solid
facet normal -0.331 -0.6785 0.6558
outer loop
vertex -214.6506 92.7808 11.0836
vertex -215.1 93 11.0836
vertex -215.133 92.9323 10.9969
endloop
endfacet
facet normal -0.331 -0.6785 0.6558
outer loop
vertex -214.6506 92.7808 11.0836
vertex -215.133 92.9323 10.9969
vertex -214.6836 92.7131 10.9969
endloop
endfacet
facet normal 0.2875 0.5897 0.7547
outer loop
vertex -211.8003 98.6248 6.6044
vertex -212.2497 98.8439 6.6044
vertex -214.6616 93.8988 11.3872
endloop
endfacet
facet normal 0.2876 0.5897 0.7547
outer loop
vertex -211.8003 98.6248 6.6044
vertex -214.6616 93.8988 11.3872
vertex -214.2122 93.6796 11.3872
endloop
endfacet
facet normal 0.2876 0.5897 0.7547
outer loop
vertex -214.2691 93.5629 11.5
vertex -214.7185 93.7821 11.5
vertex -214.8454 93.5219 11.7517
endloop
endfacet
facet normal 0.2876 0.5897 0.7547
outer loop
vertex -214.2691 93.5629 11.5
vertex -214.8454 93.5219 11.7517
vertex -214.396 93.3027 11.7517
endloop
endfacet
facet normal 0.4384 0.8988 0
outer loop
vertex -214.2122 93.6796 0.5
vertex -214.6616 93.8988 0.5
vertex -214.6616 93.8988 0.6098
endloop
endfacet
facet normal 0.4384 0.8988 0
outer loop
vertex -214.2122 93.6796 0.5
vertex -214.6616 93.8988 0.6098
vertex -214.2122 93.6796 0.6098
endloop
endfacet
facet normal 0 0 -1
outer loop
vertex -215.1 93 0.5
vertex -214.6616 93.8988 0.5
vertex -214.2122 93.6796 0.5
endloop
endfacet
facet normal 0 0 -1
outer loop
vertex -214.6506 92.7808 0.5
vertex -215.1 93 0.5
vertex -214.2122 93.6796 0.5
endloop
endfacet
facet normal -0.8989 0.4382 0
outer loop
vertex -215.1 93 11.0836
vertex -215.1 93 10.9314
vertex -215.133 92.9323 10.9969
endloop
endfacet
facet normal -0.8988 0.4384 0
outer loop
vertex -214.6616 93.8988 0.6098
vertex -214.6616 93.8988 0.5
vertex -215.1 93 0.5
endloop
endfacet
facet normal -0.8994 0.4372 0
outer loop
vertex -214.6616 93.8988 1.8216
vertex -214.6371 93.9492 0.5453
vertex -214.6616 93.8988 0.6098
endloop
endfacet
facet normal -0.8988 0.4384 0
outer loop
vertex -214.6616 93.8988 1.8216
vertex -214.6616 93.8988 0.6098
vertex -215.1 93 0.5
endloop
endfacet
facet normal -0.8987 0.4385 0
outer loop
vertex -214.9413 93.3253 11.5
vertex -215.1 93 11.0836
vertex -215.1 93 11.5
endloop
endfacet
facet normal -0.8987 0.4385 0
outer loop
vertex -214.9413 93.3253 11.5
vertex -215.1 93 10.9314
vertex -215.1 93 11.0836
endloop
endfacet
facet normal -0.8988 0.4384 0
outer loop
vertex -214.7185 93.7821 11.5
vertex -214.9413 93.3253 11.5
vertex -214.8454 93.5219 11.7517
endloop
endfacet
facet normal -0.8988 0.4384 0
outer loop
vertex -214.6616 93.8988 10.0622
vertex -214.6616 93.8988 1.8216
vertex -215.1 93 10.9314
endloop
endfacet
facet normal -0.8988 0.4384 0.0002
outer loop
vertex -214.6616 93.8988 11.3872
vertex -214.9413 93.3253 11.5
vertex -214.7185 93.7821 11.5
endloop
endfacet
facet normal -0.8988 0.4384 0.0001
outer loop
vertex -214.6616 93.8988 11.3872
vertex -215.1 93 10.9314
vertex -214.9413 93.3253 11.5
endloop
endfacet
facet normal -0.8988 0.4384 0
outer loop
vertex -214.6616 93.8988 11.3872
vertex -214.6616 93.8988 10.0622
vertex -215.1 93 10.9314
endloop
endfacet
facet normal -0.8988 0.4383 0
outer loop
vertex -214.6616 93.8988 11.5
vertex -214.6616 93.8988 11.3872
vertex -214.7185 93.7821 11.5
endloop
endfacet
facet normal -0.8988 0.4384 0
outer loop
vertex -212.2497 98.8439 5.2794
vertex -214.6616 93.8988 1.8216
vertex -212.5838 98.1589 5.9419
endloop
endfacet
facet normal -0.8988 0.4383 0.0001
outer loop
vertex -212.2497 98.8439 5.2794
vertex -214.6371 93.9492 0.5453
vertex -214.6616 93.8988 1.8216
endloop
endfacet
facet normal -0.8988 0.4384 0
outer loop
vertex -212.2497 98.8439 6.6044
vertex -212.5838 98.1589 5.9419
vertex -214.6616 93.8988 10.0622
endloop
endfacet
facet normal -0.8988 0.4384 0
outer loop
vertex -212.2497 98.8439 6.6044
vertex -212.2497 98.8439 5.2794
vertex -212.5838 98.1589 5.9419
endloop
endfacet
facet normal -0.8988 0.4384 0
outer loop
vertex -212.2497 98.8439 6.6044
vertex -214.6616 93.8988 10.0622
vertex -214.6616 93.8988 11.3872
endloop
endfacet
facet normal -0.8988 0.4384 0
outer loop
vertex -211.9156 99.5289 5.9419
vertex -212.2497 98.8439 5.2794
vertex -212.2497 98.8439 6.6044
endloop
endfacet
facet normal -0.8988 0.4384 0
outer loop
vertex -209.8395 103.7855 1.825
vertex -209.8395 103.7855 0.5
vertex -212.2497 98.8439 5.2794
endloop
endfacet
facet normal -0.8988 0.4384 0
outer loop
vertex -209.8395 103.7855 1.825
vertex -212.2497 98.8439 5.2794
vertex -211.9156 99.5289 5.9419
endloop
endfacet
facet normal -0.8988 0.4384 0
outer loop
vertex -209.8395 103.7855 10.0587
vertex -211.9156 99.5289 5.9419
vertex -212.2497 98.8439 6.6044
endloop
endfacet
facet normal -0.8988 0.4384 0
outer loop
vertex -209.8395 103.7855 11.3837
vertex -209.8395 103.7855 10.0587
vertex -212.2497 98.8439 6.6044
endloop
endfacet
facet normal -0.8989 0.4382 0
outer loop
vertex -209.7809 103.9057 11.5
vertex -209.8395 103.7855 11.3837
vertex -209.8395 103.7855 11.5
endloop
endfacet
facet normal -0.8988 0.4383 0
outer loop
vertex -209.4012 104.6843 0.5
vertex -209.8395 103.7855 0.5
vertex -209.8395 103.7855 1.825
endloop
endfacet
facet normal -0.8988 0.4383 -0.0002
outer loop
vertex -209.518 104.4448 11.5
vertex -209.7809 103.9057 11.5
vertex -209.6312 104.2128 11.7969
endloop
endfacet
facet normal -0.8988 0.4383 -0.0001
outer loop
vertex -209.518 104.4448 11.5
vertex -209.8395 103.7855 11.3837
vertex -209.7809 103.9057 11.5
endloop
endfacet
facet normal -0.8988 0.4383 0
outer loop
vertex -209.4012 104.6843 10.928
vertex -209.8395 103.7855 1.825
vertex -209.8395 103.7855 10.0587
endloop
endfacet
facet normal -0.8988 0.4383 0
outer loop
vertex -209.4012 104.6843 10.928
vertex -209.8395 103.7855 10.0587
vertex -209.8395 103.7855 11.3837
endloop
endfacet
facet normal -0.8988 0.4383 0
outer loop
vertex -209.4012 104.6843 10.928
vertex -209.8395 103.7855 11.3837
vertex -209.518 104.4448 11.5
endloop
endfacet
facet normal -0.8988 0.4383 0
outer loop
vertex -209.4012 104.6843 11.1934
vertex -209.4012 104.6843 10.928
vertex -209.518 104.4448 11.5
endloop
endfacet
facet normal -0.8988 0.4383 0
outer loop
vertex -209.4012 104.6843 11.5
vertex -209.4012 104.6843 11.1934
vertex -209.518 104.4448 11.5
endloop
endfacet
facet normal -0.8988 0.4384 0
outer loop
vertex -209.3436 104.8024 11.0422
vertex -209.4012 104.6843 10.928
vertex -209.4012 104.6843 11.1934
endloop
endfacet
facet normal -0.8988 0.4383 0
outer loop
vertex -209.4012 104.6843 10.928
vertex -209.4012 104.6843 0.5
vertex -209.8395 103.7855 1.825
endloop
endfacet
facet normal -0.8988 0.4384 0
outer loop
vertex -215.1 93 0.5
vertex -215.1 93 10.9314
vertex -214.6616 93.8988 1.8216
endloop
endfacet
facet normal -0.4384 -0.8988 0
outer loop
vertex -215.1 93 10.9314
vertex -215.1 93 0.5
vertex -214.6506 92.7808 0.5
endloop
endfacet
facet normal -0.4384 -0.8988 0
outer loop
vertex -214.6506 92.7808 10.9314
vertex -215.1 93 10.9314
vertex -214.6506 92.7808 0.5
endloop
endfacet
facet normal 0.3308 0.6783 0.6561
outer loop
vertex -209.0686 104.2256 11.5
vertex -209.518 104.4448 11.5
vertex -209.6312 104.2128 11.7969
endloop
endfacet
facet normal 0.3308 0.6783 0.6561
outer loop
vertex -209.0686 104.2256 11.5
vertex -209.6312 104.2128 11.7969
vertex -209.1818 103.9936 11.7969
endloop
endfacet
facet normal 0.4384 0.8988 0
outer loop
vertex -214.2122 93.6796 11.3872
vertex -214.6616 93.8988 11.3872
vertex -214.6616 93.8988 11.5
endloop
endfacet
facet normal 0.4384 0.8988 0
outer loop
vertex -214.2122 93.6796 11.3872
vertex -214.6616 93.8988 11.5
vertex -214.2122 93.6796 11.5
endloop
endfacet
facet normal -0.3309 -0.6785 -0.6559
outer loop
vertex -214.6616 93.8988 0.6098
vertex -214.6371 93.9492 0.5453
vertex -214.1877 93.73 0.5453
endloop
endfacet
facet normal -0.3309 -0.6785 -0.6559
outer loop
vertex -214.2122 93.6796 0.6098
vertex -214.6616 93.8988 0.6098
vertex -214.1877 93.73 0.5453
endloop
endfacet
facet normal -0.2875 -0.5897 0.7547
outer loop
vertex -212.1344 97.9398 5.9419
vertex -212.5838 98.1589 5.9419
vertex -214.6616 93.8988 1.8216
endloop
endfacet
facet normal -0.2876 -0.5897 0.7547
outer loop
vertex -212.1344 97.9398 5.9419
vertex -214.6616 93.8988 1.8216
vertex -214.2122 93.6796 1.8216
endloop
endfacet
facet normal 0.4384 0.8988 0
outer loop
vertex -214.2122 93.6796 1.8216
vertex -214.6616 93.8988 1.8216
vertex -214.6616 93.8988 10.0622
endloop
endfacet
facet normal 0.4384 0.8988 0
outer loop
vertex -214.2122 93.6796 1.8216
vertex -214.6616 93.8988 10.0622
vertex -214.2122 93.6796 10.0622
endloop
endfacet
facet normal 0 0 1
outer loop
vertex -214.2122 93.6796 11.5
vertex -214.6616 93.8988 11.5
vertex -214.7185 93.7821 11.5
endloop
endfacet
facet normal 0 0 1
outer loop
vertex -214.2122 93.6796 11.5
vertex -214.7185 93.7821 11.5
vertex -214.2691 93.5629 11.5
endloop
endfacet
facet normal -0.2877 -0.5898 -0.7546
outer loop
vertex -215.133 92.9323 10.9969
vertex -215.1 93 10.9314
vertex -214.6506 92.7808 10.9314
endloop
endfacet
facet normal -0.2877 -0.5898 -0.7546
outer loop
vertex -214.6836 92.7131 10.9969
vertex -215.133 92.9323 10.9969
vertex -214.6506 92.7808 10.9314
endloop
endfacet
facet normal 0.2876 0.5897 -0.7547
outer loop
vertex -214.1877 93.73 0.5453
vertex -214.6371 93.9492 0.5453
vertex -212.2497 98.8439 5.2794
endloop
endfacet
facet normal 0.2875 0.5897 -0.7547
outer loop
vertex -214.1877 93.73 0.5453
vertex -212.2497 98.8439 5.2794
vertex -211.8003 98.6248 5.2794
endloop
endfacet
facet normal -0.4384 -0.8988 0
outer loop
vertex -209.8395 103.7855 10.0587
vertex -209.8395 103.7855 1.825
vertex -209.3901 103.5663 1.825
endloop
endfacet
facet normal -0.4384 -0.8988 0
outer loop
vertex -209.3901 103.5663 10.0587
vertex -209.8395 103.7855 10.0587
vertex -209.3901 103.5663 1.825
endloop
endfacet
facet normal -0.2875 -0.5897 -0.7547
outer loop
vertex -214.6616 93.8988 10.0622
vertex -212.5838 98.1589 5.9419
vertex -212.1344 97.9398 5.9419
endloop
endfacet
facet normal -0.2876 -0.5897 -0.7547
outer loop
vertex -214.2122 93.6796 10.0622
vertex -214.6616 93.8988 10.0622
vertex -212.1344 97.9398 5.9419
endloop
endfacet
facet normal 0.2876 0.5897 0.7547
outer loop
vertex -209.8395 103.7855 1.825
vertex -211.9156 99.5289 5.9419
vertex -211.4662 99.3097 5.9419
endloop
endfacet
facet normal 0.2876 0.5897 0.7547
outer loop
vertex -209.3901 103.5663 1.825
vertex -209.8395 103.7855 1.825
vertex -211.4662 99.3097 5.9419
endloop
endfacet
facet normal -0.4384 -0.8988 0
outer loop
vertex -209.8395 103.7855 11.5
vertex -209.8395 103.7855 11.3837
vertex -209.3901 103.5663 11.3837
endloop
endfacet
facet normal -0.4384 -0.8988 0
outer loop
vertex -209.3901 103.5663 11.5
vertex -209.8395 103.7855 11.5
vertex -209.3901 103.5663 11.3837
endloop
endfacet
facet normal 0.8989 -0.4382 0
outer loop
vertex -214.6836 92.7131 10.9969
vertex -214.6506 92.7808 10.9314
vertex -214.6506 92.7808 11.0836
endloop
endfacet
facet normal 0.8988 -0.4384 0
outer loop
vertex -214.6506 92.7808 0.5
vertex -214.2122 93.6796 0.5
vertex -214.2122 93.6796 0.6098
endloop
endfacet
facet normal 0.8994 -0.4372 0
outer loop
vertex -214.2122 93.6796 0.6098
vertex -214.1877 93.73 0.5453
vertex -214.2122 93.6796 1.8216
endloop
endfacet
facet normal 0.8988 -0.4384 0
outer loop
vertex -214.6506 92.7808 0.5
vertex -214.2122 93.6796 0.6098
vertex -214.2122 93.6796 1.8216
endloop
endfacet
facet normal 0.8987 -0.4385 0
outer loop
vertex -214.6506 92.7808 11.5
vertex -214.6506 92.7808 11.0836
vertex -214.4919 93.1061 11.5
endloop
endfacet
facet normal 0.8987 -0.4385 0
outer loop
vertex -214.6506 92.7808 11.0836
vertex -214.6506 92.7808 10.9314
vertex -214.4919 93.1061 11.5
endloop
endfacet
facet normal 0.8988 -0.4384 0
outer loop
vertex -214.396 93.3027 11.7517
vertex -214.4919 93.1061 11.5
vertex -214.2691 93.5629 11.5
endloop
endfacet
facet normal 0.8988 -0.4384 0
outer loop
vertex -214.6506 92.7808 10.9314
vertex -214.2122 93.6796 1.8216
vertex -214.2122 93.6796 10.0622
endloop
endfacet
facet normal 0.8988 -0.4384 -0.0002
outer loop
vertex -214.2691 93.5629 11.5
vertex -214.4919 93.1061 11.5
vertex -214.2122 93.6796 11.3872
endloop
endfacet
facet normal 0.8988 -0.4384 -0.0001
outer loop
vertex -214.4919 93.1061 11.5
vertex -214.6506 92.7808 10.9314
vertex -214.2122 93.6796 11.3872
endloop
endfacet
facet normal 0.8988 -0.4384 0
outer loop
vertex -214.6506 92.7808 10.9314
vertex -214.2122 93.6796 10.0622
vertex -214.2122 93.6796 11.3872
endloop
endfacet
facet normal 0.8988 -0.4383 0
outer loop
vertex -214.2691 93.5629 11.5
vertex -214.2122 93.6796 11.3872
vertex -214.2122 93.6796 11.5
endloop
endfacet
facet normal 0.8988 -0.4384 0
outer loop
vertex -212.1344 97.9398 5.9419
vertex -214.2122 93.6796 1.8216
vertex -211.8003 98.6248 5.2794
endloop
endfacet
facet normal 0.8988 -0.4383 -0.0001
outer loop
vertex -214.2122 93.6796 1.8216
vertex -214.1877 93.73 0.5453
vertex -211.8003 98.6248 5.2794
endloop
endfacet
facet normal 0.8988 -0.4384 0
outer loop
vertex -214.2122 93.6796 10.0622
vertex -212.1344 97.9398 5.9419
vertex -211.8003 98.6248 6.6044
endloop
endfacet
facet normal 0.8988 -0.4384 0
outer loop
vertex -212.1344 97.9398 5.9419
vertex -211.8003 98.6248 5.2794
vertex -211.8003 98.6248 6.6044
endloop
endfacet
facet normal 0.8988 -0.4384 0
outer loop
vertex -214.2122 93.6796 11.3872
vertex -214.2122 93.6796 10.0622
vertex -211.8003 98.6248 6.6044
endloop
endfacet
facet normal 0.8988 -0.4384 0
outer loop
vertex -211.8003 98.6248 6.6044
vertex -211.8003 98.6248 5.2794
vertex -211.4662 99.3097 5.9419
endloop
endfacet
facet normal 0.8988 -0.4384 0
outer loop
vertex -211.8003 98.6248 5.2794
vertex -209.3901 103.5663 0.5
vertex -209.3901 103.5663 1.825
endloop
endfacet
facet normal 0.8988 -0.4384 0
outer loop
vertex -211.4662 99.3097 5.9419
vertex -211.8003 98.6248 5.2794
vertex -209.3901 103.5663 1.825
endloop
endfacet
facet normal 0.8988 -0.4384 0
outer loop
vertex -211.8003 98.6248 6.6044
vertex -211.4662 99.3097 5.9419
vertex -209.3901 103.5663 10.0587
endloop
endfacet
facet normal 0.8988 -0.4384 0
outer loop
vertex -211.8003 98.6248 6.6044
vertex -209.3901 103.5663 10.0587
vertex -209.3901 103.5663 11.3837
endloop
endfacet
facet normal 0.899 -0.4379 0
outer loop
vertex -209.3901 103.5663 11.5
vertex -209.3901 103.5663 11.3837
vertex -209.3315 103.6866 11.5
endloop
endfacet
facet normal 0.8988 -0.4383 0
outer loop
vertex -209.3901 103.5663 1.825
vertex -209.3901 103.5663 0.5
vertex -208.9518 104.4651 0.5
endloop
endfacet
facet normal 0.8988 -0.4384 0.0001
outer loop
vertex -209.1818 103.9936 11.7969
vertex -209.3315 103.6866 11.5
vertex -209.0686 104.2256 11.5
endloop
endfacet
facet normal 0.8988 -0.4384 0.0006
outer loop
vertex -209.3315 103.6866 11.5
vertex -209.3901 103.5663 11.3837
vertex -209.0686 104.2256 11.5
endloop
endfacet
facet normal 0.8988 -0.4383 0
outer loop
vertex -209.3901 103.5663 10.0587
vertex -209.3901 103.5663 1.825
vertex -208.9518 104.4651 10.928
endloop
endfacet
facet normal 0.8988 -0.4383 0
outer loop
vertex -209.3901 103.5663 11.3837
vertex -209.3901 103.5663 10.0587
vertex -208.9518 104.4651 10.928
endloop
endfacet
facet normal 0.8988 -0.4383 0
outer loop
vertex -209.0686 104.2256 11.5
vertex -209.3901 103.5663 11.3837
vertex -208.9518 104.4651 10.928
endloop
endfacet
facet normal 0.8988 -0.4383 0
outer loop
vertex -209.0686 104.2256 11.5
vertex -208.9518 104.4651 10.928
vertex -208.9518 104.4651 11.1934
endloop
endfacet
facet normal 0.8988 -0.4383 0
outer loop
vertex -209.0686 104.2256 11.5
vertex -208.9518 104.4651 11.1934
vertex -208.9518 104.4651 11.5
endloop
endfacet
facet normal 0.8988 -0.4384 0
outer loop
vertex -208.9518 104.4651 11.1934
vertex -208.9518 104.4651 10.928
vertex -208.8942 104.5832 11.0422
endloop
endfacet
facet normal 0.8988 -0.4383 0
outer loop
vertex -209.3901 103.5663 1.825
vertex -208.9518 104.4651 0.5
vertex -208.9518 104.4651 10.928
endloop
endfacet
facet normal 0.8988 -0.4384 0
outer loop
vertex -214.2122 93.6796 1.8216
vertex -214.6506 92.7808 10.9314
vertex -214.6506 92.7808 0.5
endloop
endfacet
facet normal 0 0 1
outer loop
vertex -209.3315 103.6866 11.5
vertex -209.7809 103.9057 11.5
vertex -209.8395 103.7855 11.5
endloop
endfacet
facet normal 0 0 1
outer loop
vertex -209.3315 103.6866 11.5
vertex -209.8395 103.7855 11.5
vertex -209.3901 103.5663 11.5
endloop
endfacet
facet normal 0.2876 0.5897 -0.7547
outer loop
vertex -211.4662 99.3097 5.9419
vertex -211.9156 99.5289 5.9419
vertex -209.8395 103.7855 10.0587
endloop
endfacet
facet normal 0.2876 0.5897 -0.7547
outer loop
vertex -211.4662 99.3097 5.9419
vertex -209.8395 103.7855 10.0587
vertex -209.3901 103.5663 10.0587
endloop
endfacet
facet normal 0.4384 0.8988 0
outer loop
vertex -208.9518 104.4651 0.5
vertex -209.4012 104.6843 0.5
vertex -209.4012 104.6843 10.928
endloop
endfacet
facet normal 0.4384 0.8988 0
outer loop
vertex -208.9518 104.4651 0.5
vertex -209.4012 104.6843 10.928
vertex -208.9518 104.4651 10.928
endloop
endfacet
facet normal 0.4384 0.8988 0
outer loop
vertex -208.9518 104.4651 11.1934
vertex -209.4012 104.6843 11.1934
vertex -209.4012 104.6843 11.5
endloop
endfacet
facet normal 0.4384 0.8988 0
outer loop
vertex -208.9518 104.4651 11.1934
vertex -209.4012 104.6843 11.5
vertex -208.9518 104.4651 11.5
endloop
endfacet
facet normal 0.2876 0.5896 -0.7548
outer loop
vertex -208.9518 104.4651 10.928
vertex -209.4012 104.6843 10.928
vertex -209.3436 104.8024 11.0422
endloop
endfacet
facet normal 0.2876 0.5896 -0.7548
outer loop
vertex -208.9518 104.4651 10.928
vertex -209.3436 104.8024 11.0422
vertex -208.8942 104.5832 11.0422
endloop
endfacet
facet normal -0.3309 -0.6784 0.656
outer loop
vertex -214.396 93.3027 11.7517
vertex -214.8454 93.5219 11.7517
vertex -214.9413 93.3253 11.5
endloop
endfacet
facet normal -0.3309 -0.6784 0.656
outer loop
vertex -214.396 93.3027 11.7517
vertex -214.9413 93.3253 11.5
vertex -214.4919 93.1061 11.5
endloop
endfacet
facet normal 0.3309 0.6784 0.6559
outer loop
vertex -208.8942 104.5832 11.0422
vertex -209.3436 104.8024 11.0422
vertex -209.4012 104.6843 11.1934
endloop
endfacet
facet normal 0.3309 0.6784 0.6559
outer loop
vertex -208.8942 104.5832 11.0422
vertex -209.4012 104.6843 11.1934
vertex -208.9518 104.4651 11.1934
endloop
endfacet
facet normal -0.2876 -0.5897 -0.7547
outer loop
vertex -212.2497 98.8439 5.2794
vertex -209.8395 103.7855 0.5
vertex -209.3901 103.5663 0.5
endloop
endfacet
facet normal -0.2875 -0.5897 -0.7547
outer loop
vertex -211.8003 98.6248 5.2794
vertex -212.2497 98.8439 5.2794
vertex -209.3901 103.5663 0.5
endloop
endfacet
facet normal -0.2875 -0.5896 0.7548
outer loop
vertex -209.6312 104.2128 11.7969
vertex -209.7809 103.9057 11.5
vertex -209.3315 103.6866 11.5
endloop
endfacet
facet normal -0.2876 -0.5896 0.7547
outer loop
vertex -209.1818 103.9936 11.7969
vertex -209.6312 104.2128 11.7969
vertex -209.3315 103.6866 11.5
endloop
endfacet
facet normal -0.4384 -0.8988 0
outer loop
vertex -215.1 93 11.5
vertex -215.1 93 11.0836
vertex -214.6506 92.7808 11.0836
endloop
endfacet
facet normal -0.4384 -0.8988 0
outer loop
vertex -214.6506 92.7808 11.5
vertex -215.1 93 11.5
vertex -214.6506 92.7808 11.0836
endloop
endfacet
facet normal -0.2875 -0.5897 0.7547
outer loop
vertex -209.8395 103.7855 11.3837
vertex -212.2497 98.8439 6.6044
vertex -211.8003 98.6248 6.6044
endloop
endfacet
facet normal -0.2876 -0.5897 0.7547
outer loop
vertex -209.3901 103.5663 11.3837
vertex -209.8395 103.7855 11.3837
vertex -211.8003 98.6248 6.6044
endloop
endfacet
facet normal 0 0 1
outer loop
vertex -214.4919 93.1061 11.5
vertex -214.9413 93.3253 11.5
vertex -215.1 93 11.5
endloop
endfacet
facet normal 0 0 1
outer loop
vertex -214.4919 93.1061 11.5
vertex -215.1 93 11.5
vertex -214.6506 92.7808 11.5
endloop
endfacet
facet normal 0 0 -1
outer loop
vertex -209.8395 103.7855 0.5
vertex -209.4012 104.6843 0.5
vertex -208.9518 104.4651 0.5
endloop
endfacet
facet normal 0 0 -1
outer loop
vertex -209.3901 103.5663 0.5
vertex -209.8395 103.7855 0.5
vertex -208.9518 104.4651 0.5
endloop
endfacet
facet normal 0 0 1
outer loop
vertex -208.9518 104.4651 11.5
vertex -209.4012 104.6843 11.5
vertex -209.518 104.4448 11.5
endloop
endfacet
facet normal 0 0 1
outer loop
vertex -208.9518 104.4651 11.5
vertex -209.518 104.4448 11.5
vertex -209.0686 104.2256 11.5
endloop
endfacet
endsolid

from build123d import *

# Parameters (mm, degrees)
BOX212_W                  = 0.5
BOX212_H                  = 1
BOX212_DEPTH              = 11
BOX213_W                  = 0.5
BOX213_H                  = 1
BOX213_DEPTH              = 16
BOX213_ROLL_ANGLE         = 49
BOX214_W                  = 0.5
BOX214_H                  = 1
BOX214_DEPTH              = 16
BOX214_ROLL_ANGLE         = -49
BOX211_W                  = 0.5
BOX211_H                  = 1
BOX211_DEPTH              = 11
FUSION015_PLACEMENT_ANGLE = -26


with BuildPart() as cubo212:
    # Box212 → Box212 (new body)
    with BuildSketch(Plane(origin=(0, 12, 0.5), x_dir=(1, 0, 0), z_dir=(0, 0, 1))):
        with Locations((0.25, 0.5)):
            Rectangle(BOX212_W, BOX212_H)
    extrude(amount=BOX212_DEPTH)


with BuildPart() as cubo213:
    # Box213 → Box213 (new body)
    with BuildSketch(Plane.XY):
        with Locations((0.25, 0.5)):
            Rectangle(BOX213_W, BOX213_H)
    extrude(amount=BOX213_DEPTH)


with BuildPart() as cubo213_1:
    # Box213 roll: moved
    add(cubo213.part.rotate(Axis((0, 0, 0), (1, 0, 0)), BOX213_ROLL_ANGLE))


with BuildPart() as cubo213_2:
    # Box213 placement: moved
    add(cubo213_1.part.moved(Location((0, 12, 0.5))))


with BuildPart() as cubo214:
    # Box214 → Box214 (new body)
    with BuildSketch(Plane.XY):
        with Locations((0.25, 0.5)):
            Rectangle(BOX214_W, BOX214_H)
    extrude(amount=BOX214_DEPTH)


with BuildPart() as cubo214_1:
    # Box214 roll: moved
    add(cubo214.part.rotate(Axis((0, 0, 0), (1, 0, 0)), BOX214_ROLL_ANGLE))


with BuildPart() as cubo214_2:
    # Box214 placement: moved
    add(cubo214_1.part.moved(Location((0, 0.4, 1.3))))


with BuildPart() as fusion015:
    # Box211 → Box211 (new body)
    with BuildSketch(Plane.XY.offset(0.5)):
        with Locations((0.25, 0.5)):
            Rectangle(BOX211_W, BOX211_H)
    extrude(amount=BOX211_DEPTH)

    # Fusion015: union Cubo212, Cubo213, Cubo214
    add(cubo212.part)
    add(cubo213_2.part)
    add(cubo214_2.part)


with BuildPart() as fusion015_1:
    # Fusion015 placement: moved
    add(fusion015.part.moved(Location((-215.1, 93, 0))).rotate(Axis((-215.1, 93, 0), (0, 0, 1)), FUSION015_PLACEMENT_ANGLE))


solid = fusion015_1.part
